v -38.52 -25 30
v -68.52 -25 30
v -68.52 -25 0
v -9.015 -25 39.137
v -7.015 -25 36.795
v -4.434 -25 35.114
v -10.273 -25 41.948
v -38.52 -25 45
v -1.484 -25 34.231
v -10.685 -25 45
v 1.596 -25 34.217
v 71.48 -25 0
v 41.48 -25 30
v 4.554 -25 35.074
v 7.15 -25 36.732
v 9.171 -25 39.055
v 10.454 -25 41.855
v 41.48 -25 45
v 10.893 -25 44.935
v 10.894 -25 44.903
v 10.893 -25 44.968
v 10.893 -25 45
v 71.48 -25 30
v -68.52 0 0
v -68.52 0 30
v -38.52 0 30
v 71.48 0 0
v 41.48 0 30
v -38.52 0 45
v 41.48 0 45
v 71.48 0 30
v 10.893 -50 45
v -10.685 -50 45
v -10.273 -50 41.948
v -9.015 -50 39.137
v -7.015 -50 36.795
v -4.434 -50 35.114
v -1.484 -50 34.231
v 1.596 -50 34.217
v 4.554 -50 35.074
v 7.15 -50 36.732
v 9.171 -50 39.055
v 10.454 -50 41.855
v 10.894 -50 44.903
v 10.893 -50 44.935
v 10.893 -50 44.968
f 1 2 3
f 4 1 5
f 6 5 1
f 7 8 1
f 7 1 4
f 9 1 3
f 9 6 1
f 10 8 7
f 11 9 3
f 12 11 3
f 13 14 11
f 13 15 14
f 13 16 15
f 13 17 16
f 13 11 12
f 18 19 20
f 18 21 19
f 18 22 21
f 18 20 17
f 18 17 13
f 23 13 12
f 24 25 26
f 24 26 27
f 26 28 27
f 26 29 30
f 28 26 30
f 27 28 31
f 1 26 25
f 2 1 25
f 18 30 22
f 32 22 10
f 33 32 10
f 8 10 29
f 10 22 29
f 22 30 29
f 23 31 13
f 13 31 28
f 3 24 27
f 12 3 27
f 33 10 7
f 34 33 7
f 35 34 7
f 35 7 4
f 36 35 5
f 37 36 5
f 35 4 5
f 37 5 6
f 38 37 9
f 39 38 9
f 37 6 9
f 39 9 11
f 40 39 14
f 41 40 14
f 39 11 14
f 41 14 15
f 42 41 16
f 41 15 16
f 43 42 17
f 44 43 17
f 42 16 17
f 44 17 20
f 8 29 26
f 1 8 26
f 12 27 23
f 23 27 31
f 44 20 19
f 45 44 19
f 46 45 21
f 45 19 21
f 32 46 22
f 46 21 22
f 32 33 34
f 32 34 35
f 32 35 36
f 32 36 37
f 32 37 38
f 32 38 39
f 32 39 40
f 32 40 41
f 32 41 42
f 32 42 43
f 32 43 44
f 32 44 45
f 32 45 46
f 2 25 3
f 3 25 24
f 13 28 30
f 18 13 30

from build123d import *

# Parameters (mm, degrees)
F1_DEPTH = 25
F3_DEPTH = 25


with BuildPart() as f1:
    # F0 (on Front) → F1 (new body)
    with BuildSketch(Plane.XZ):
        Polygon((-68.520491, 30), (-68.520491, 0), (71.479509, 0), (71.479509, 30), (41.479509, 30), (41.479509, 45), (-38.520491, 45), (-38.520491, 30), align=None)
    extrude(amount=F1_DEPTH)

    # F2 (on face) → F3 (join)
    with BuildSketch(Plane.XZ.offset(25)):
        with BuildLine():
            ThreePointArc((-10.685148, 45), (0.05549, 34.113566), (10.893544, 44.903021))
            ThreePointArc((10.893544, 44.903021), (10.893435, 44.951511), (10.893108, 45))
            Line((10.893108, 45), (-10.685148, 45))
        make_face()
    extrude(amount=F3_DEPTH)


solid = f1.part
